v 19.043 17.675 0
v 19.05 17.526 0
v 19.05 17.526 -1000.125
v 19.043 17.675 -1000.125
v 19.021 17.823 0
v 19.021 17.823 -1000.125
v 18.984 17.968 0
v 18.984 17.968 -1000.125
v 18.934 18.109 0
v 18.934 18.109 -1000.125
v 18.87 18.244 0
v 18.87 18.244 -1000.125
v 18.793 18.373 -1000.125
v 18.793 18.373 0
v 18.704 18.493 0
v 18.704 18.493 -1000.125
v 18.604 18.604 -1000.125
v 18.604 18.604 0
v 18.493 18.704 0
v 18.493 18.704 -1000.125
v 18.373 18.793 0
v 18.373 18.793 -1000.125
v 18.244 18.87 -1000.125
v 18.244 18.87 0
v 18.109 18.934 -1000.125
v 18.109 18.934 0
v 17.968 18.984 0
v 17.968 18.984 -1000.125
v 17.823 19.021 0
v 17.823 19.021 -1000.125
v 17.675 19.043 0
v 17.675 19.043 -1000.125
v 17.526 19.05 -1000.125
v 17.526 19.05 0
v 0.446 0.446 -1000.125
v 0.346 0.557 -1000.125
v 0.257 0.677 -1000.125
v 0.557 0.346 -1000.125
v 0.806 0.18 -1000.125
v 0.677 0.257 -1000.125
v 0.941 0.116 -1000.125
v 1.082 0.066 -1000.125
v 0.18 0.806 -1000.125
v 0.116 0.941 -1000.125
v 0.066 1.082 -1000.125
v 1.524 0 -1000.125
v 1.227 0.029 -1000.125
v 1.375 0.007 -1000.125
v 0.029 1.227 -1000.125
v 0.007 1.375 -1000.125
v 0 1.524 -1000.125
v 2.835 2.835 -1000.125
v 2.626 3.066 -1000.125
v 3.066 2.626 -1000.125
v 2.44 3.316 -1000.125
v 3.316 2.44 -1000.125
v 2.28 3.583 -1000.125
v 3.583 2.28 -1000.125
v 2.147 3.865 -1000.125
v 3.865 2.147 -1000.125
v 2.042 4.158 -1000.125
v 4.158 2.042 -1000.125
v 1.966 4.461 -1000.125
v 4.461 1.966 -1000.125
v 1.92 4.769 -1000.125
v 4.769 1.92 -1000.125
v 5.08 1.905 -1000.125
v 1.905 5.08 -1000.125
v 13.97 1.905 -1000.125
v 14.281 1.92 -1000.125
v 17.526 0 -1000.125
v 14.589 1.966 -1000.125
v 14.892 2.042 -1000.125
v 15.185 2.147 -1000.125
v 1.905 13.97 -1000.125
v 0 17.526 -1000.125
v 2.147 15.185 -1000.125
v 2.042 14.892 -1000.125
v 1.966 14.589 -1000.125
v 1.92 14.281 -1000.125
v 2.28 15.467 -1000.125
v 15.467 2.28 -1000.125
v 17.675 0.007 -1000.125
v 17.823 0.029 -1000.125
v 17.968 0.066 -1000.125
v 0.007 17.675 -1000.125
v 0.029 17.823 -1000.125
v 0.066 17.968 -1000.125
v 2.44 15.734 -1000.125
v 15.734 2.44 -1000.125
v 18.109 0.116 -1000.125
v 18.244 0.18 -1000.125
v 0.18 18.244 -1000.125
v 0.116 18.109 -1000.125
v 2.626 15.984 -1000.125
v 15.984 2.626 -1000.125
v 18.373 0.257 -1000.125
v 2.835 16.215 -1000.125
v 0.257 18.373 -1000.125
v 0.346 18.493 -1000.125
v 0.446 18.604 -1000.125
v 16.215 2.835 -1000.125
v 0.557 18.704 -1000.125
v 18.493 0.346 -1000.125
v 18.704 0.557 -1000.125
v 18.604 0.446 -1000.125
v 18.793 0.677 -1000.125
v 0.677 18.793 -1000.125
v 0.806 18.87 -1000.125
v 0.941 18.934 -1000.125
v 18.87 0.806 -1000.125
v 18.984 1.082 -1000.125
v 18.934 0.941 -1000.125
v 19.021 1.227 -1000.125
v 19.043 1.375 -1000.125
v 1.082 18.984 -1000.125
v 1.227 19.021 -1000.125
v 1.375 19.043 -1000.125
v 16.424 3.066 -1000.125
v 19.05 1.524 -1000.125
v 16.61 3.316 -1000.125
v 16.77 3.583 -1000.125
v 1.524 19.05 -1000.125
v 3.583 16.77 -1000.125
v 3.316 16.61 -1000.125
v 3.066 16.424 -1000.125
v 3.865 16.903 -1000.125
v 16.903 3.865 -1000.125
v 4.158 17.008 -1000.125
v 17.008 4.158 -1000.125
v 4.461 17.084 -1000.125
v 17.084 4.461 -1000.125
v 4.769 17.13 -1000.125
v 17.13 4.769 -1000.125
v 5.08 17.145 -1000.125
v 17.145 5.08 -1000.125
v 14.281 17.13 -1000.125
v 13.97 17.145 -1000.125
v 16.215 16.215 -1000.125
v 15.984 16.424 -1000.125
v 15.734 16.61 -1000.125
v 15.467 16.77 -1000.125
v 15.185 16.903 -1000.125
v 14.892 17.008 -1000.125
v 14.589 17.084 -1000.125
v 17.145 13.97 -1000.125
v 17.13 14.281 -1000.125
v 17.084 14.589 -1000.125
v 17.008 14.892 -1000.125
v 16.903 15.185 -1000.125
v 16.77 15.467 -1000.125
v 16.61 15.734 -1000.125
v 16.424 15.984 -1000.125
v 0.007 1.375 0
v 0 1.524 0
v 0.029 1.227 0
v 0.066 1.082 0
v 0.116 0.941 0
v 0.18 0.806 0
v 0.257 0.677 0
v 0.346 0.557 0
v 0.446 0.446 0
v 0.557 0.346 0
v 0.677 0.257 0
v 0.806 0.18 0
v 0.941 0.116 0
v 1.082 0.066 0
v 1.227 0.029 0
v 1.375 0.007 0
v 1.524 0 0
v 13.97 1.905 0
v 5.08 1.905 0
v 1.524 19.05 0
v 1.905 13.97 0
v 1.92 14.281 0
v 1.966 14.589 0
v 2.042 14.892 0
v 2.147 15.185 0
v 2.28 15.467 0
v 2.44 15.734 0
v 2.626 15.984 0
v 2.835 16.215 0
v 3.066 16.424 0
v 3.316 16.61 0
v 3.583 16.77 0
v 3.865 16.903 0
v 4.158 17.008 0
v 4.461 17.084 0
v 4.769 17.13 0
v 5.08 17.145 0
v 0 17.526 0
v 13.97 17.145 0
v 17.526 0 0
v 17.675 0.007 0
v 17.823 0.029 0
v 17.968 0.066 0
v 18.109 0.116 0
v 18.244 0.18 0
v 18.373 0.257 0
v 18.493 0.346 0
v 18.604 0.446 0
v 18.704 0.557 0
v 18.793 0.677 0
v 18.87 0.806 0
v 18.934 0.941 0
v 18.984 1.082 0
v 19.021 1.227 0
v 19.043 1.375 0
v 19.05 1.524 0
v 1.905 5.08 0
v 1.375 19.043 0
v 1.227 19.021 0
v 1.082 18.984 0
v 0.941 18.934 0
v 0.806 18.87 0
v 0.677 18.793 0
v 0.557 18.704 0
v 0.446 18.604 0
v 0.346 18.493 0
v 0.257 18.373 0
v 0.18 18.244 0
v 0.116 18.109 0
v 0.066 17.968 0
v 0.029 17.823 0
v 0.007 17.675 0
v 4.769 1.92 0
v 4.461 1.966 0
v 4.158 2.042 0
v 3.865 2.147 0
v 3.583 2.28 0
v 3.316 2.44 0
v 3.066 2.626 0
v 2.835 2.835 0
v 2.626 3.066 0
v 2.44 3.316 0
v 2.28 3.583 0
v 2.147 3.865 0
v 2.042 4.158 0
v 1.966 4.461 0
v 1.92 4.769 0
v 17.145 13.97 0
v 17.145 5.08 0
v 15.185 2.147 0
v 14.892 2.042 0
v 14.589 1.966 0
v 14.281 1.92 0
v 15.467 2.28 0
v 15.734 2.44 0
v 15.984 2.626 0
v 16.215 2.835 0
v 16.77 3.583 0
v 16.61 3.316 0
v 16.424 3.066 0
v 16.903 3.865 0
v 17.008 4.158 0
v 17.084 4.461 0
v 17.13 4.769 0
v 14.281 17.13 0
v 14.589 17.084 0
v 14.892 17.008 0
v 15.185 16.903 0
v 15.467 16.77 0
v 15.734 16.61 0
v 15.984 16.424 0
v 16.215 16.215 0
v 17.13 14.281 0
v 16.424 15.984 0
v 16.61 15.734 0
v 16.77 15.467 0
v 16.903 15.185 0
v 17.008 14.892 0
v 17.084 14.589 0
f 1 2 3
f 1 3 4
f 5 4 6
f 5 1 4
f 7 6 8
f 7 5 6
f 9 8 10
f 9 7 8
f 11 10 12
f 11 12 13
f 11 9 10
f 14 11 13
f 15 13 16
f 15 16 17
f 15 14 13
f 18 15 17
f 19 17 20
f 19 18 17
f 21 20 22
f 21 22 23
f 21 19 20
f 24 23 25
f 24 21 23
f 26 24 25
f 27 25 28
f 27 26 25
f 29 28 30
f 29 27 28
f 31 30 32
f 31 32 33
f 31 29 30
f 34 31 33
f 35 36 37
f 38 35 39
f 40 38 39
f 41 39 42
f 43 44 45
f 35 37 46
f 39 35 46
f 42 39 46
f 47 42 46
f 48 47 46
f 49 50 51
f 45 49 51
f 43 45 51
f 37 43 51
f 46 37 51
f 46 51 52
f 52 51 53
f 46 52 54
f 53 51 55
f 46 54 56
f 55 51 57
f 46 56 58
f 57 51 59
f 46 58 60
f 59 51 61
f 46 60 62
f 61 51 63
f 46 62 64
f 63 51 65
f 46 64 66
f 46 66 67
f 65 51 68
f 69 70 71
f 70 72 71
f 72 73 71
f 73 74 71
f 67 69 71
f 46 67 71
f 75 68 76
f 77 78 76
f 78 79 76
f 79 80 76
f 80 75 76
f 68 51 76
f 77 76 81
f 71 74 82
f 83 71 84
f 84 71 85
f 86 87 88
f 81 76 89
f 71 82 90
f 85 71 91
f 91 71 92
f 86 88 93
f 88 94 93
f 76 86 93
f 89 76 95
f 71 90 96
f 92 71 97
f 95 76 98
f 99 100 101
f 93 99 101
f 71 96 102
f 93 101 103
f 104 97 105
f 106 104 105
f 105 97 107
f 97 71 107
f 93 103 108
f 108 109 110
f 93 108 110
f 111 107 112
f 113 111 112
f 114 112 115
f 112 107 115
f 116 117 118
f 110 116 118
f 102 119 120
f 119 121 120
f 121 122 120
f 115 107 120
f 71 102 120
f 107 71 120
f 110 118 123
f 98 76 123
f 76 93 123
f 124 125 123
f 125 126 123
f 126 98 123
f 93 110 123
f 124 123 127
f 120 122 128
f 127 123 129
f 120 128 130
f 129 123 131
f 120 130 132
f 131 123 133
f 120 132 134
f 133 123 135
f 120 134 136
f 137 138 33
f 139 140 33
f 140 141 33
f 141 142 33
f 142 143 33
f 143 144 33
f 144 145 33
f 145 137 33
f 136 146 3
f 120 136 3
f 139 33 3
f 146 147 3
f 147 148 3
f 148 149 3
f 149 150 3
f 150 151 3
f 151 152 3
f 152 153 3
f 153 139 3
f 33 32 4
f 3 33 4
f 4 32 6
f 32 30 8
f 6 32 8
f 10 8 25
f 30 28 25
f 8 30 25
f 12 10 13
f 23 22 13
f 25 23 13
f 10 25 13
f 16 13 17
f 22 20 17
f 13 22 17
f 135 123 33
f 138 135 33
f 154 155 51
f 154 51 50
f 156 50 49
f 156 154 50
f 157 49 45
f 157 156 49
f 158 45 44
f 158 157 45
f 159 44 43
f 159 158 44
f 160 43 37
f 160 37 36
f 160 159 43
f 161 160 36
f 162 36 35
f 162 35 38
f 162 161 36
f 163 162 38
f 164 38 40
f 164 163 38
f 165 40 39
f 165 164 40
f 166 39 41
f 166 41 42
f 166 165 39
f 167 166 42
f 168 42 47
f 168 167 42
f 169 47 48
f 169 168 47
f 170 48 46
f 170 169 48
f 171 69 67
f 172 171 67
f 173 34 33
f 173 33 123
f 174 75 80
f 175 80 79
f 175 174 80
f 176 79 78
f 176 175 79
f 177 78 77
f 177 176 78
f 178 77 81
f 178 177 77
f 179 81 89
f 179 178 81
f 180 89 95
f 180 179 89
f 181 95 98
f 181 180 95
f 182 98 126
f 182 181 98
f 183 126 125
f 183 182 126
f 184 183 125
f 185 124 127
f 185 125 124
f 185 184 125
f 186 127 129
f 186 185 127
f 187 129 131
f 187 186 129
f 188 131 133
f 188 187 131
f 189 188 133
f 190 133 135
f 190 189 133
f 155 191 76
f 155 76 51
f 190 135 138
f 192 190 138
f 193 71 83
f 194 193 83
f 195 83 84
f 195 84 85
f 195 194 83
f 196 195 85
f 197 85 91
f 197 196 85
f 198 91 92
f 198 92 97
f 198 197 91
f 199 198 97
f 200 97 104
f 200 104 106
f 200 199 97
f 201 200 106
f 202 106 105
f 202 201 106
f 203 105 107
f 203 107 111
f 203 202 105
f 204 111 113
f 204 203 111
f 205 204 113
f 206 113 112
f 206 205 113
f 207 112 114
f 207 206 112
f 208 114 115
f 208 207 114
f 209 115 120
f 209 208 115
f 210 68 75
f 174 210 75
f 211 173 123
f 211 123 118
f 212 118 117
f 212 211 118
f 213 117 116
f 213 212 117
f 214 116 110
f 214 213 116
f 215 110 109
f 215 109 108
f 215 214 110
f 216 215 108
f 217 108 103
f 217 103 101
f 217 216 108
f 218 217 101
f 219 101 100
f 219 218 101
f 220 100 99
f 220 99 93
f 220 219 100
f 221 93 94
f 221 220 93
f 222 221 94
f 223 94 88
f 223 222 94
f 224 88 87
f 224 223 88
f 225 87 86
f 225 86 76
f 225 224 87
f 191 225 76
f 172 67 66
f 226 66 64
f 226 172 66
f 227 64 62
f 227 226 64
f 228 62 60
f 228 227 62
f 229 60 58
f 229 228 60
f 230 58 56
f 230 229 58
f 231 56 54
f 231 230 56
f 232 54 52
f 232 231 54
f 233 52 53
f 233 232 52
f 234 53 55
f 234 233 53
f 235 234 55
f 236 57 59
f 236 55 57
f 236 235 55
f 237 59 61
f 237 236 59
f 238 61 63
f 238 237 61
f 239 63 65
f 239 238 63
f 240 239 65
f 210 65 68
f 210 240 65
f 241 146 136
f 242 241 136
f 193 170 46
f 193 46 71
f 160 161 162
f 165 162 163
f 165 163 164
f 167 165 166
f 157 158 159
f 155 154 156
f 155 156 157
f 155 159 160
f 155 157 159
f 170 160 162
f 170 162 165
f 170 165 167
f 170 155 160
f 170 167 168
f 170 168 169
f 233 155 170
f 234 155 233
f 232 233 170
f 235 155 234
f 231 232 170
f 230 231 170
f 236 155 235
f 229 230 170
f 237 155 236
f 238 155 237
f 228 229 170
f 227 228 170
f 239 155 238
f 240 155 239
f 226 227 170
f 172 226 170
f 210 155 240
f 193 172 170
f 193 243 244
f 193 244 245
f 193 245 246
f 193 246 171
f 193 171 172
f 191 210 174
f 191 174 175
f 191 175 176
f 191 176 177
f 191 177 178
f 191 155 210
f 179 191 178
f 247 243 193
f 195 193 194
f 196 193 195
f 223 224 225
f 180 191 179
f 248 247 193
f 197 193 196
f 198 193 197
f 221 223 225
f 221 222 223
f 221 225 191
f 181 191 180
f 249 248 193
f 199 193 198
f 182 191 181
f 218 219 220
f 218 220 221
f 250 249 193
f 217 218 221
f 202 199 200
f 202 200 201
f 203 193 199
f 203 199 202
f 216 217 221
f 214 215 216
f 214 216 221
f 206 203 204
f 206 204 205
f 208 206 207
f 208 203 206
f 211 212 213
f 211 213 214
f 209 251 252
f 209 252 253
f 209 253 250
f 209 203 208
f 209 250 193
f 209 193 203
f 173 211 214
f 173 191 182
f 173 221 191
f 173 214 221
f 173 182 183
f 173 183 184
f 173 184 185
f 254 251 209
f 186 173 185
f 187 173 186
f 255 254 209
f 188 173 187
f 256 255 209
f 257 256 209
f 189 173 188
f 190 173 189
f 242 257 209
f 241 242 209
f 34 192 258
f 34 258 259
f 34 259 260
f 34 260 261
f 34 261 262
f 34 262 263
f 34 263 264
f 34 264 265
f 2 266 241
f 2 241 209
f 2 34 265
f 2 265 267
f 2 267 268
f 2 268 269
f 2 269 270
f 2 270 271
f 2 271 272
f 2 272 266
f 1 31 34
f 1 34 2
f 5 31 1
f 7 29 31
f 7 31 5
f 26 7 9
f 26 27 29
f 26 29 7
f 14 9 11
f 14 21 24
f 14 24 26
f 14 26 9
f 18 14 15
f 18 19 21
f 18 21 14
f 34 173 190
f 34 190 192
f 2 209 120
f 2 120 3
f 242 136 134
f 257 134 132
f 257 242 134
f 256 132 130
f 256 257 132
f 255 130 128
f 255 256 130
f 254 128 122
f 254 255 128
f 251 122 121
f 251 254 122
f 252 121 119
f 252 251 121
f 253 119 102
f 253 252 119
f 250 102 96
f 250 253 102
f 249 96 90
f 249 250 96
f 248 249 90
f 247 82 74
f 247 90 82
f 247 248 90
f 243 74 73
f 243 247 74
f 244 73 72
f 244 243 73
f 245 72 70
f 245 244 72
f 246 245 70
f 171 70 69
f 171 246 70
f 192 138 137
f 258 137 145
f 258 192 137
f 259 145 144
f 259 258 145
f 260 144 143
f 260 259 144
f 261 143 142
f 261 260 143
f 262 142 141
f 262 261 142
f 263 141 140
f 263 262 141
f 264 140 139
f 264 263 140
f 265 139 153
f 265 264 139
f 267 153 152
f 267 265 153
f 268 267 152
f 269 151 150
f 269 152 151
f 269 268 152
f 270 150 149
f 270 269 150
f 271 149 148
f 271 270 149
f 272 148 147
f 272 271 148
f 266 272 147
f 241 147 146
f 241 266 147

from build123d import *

# Parameters (mm, degrees)
BOSS_EXTRUDE1_DEPTH = 1000.125
CUT_EXTRUDE1_DEPTH  = 1001.125


with BuildPart() as part:
    # Sketch1 → Boss-Extrude1 (new body)
    with BuildSketch(Plane.XY):
        with BuildLine():
            Line((1.524, 0), (17.526, 0))
            ThreePointArc((17.526, 0), (18.603630735, 0.446369265), (19.05, 1.524))
            Line((19.05, 1.524), (19.05, 17.526))
            ThreePointArc((19.05, 17.526), (18.603630735, 18.603630735), (17.526, 19.05))
            Line((17.526, 19.05), (1.524, 19.05))
            ThreePointArc((1.524, 19.05), (0.446369265, 18.603630735), (0, 17.526))
            Line((0, 17.526), (0, 1.524))
            ThreePointArc((0, 1.524), (0.446369265, 0.446369265), (1.524, 0))
        make_face()
    extrude(amount=-BOSS_EXTRUDE1_DEPTH)

    # Sketch2 → Cut-Extrude1 (cut, through all)
    with BuildSketch(Plane.XY):
        with BuildLine():
            Line((5.08, 17.145), (13.97, 17.145))
            ThreePointArc((13.97, 17.145), (16.21506403, 16.21506403), (17.145, 13.97))
            Line((17.145, 13.97), (17.145, 5.08))
            ThreePointArc((17.145, 5.08), (16.21506403, 2.83493597), (13.97, 1.905))
            Line((13.97, 1.905), (5.08, 1.905))
            ThreePointArc((5.08, 1.905), (2.83493597, 2.83493597), (1.905, 5.08))
            Line((1.905, 5.08), (1.905, 13.97))
            ThreePointArc((1.905, 13.97), (2.83493597, 16.21506403), (5.08, 17.145))
        make_face()
    extrude(amount=-CUT_EXTRUDE1_DEPTH, mode=Mode.SUBTRACT)


solid = part.part
